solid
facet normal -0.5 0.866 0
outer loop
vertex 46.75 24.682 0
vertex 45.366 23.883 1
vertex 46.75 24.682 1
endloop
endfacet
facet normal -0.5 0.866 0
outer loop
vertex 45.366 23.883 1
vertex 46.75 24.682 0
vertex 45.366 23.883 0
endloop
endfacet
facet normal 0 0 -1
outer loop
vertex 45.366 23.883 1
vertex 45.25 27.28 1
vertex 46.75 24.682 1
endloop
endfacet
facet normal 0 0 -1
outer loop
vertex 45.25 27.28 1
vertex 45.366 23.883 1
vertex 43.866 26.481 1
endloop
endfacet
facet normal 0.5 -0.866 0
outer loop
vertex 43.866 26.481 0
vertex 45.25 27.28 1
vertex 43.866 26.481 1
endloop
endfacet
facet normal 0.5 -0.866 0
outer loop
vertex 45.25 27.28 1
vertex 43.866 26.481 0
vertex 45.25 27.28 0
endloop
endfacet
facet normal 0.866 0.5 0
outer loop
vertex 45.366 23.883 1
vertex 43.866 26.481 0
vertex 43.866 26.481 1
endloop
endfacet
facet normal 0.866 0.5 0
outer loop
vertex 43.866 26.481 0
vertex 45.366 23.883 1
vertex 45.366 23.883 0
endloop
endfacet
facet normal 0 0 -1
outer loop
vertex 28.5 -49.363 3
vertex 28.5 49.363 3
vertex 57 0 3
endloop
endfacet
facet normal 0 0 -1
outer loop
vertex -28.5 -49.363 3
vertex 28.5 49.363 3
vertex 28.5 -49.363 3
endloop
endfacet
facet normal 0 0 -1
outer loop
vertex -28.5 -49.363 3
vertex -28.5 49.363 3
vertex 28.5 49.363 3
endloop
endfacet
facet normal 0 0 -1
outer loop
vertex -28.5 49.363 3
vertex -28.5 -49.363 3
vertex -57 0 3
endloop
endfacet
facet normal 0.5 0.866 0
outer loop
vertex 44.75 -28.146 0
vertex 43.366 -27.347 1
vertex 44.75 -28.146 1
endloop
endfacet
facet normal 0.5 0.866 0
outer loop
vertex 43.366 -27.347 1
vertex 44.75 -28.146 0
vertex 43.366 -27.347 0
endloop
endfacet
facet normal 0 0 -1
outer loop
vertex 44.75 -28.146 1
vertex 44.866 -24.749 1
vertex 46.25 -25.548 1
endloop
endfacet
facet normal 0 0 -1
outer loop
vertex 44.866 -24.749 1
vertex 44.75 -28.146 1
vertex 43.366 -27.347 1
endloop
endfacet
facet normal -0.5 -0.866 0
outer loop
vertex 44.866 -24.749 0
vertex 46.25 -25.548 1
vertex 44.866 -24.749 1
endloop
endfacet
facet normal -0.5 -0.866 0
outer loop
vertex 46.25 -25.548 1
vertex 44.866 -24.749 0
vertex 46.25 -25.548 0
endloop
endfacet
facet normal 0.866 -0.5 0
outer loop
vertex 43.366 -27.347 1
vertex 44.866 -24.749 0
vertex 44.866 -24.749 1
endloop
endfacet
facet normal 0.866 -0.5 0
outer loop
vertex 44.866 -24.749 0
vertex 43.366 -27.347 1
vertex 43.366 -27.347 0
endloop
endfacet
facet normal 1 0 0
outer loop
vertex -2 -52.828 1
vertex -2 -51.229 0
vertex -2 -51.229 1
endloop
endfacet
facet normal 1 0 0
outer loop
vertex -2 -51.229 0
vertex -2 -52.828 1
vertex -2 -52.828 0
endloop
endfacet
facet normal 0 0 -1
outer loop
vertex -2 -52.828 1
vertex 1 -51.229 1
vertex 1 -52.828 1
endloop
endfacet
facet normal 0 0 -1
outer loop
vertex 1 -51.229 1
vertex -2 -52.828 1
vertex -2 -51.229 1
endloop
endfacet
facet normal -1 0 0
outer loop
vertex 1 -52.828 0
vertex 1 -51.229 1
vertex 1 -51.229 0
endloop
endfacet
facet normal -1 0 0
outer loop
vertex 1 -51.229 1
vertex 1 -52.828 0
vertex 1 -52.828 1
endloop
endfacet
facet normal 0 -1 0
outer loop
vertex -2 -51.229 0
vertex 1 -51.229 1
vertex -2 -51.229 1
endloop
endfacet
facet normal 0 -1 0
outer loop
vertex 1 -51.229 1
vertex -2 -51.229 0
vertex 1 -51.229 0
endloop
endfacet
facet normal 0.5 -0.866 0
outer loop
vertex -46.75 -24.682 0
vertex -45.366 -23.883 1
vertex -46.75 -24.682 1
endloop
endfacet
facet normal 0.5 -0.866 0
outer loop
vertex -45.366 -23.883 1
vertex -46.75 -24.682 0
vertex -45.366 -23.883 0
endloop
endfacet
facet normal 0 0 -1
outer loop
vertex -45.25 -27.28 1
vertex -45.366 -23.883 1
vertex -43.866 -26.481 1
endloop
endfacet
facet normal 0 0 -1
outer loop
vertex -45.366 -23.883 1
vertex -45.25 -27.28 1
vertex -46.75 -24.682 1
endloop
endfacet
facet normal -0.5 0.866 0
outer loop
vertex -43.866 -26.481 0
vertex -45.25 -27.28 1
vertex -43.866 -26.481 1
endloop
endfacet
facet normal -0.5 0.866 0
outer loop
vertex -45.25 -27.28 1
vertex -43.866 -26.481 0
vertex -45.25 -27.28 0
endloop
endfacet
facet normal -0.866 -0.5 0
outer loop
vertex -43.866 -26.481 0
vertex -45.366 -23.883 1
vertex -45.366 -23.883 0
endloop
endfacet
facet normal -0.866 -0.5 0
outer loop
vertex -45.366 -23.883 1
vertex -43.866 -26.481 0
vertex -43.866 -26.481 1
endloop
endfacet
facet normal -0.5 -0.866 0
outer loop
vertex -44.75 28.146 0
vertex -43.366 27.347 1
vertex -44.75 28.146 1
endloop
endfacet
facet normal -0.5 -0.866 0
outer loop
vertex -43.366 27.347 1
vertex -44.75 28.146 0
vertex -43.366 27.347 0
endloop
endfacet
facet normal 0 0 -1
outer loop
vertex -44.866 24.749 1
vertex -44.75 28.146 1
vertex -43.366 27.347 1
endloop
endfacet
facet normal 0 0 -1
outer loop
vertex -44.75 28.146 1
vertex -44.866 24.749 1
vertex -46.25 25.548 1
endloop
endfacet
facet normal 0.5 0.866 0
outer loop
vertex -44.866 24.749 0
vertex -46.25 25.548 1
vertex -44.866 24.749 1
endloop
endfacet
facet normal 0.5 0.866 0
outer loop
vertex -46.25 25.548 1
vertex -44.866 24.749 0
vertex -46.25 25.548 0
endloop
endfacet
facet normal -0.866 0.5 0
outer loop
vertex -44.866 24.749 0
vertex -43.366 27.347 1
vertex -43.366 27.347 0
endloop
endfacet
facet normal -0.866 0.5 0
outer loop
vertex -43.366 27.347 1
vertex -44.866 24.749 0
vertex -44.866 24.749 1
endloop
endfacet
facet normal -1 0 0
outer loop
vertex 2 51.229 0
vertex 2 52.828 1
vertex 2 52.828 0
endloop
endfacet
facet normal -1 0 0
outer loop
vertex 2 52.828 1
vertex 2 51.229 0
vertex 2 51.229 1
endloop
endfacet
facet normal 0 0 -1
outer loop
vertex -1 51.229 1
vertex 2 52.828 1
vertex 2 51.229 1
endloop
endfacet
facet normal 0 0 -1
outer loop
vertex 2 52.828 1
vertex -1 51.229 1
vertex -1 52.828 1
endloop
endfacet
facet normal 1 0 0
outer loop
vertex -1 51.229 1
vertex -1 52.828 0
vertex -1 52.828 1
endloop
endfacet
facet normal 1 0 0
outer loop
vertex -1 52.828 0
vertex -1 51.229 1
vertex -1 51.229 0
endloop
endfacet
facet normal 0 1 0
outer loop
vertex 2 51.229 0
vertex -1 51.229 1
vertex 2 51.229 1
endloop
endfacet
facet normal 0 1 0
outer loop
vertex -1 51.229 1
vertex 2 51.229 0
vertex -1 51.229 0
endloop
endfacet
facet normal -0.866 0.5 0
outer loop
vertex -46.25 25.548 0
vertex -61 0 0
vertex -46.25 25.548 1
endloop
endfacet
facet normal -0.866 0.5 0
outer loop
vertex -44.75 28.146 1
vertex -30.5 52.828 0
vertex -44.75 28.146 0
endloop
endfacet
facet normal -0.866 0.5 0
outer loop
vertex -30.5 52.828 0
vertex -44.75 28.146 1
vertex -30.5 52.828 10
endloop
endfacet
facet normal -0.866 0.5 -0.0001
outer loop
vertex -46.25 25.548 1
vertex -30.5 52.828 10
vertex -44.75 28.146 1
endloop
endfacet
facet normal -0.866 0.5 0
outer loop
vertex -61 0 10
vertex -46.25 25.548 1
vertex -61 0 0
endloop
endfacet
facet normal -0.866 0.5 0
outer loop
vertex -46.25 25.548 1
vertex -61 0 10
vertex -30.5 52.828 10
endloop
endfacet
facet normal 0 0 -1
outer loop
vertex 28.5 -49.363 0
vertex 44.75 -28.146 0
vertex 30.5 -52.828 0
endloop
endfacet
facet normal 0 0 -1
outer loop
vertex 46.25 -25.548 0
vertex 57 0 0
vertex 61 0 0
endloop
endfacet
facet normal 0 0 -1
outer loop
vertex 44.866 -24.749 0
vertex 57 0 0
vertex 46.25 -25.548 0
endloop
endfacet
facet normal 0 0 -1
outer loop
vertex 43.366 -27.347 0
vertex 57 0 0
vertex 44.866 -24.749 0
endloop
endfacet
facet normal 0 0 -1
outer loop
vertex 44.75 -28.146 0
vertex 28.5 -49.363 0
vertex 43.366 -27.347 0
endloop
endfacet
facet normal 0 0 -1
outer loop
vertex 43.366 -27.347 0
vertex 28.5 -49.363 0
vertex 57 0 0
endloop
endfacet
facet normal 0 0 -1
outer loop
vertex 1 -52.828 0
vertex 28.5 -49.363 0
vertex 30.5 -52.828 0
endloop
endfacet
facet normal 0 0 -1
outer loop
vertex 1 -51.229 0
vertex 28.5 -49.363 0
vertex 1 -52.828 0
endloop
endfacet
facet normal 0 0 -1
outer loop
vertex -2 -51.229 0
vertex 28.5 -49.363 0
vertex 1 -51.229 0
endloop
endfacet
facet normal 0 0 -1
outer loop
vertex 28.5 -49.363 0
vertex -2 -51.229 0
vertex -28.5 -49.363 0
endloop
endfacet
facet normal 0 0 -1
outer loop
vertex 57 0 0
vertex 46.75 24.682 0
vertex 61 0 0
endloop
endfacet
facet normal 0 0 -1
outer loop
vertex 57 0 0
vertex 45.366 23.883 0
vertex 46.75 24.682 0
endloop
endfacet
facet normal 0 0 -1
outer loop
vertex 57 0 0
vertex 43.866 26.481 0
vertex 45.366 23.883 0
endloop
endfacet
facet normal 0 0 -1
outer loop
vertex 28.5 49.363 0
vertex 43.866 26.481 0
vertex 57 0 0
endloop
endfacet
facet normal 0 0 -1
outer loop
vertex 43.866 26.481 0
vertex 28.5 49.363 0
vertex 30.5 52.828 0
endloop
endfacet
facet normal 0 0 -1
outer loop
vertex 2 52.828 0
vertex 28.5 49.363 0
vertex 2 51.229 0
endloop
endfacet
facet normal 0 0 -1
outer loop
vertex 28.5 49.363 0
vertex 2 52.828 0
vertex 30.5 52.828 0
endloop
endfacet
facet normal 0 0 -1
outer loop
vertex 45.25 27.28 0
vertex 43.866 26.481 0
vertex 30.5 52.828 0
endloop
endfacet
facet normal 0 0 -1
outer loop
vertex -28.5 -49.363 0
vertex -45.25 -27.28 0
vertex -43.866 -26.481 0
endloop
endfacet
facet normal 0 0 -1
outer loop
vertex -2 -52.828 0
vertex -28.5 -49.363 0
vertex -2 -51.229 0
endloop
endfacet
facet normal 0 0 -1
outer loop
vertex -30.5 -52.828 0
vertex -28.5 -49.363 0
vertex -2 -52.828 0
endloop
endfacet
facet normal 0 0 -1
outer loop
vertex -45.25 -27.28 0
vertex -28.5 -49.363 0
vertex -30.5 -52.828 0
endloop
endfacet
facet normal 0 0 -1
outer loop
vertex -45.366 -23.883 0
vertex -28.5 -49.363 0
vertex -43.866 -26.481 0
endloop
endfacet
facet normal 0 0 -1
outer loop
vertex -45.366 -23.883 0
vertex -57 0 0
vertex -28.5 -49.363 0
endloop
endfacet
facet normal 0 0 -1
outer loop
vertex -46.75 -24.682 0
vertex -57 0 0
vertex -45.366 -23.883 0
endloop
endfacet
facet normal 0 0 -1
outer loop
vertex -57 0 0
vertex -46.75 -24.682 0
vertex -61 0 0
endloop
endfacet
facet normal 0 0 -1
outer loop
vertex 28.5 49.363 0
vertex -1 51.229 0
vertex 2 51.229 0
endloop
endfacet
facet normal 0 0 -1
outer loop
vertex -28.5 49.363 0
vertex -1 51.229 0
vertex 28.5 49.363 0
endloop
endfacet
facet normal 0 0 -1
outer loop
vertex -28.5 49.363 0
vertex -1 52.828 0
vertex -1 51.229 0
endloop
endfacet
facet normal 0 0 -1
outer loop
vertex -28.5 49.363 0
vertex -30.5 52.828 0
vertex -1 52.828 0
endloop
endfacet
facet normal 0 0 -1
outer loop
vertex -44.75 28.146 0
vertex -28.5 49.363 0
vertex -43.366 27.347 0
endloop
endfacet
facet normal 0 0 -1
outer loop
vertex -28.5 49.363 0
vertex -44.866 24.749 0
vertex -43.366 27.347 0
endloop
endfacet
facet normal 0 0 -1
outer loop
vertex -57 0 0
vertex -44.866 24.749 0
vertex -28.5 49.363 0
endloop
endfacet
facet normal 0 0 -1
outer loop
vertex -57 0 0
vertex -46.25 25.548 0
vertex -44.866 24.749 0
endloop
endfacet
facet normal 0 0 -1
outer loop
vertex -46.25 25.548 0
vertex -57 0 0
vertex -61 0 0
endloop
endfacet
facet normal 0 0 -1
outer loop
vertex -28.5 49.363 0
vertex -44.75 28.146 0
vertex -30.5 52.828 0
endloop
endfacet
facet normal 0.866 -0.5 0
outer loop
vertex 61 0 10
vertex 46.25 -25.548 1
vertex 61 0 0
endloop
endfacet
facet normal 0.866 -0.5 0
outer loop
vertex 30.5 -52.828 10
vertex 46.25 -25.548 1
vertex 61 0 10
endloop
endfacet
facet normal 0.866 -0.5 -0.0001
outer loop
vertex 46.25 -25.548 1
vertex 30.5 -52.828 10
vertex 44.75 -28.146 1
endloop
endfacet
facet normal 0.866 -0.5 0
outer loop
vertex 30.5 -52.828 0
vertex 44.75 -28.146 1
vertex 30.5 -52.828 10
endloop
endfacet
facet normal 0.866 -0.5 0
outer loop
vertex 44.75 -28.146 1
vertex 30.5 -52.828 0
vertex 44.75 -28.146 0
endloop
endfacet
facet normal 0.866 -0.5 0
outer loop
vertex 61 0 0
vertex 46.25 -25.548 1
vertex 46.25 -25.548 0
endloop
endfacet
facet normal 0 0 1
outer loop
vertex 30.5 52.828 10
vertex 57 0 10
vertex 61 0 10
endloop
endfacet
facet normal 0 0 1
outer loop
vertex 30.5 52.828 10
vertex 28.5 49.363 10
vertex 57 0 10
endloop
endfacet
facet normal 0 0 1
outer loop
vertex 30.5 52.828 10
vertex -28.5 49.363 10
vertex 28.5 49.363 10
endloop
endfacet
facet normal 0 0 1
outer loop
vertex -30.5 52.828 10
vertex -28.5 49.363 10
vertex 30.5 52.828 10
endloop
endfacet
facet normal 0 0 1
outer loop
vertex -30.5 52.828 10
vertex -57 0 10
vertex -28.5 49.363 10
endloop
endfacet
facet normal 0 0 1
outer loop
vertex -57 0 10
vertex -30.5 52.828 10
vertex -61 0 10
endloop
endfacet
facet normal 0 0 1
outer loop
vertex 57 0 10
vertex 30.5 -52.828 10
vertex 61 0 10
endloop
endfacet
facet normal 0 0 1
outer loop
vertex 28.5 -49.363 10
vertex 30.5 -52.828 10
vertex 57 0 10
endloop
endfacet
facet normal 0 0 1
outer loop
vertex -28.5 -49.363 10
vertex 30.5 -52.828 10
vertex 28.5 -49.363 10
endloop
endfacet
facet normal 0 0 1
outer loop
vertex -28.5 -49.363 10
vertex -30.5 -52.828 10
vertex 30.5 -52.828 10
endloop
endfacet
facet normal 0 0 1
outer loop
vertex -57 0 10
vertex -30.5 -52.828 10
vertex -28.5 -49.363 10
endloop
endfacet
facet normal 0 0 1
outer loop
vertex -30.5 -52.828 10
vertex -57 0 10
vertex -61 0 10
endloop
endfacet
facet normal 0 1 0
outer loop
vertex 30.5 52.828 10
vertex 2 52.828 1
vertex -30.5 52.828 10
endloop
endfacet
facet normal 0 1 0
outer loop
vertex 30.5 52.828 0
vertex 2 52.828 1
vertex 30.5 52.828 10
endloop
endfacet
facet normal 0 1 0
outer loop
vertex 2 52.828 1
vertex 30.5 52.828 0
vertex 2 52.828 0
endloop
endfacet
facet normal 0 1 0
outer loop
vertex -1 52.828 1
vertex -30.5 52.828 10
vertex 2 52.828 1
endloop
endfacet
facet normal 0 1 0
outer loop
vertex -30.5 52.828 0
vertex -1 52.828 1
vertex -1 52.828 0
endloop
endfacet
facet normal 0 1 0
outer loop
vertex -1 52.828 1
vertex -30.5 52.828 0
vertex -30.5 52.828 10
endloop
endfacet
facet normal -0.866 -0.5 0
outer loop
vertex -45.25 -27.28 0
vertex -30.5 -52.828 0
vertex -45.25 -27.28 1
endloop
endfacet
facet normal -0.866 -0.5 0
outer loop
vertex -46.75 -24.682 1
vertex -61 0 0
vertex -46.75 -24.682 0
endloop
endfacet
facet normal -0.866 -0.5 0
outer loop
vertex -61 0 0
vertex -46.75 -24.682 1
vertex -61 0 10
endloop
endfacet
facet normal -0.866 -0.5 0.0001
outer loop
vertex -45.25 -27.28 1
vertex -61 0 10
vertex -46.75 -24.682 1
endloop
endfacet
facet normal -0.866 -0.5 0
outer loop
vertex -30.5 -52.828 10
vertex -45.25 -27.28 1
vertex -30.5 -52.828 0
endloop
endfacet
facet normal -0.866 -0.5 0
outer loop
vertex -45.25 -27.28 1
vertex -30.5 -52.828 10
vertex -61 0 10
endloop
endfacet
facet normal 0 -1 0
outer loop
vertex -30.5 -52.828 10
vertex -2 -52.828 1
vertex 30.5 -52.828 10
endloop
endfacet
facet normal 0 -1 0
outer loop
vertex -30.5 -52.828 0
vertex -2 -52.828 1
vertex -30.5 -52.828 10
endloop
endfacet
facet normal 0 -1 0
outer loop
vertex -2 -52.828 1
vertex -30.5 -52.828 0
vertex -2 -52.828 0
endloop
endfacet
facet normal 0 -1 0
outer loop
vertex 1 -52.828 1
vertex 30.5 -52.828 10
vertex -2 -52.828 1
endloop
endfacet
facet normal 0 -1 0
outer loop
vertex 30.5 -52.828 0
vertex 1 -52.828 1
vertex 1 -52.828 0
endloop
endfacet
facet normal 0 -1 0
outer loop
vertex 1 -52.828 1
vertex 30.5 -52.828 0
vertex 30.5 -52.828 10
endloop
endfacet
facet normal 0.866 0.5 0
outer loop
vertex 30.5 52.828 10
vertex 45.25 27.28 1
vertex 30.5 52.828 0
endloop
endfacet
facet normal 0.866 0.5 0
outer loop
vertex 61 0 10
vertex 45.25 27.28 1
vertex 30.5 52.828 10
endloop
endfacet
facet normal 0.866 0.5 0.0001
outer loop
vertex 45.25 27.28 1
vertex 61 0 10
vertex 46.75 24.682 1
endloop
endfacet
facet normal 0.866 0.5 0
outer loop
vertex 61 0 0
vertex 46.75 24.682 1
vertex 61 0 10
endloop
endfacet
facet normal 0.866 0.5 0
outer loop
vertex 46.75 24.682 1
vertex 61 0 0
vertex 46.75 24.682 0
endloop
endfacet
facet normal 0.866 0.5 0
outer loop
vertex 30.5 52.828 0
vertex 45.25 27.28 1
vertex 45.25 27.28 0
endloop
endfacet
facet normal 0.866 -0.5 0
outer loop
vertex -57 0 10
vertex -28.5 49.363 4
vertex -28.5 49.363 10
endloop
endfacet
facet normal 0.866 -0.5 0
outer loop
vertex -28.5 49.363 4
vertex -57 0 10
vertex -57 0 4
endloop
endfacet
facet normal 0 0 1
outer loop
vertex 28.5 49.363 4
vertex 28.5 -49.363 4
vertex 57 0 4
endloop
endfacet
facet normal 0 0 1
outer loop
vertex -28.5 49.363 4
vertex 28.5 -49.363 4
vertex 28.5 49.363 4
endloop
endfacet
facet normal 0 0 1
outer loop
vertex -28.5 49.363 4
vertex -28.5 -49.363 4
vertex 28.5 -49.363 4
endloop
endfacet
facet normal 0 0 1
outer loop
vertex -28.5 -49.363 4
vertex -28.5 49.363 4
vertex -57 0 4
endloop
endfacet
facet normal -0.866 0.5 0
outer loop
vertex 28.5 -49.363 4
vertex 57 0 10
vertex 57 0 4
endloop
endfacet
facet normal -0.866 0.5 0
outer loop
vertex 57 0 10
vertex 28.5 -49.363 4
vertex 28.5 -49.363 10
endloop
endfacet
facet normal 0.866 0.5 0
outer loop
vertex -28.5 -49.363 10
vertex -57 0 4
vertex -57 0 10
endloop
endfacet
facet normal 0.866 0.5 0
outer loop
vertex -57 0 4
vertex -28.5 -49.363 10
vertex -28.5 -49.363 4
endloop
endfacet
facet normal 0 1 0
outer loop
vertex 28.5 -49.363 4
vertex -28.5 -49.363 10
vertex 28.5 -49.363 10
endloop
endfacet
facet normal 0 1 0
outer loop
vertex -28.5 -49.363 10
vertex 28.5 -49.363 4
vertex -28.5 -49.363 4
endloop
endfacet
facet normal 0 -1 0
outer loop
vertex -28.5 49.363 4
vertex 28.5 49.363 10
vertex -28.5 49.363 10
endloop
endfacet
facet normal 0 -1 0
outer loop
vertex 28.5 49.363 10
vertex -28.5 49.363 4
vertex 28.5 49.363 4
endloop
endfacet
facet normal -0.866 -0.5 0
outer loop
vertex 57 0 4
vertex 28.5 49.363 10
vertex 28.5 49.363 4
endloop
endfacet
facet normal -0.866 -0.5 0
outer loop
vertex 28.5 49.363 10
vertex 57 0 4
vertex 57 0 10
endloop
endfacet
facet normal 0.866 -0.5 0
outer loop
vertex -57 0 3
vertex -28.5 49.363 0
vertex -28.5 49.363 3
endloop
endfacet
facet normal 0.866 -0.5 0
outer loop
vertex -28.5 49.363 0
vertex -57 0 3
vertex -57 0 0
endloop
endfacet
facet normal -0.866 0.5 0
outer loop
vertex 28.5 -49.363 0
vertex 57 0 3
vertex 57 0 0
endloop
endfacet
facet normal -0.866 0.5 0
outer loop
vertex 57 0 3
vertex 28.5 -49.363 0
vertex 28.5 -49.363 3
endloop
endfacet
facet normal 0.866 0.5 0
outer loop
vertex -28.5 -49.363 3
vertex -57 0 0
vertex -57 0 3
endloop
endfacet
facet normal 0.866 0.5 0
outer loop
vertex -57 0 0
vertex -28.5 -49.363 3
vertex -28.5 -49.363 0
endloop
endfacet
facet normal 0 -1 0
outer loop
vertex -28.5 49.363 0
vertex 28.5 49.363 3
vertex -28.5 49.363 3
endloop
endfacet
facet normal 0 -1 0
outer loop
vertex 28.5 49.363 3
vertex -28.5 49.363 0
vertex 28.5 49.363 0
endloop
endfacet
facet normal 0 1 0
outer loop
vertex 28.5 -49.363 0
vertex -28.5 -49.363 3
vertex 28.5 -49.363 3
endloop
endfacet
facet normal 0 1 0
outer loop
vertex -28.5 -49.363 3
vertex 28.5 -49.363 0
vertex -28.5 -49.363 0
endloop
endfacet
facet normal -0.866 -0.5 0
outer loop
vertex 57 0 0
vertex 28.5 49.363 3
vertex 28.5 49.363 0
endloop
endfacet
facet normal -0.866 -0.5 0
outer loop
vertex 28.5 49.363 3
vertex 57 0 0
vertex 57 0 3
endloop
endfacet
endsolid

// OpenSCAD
function toUnits(inches, thrsecs) = (inches * 32) + thrsecs;

hexCrossVertex = toUnits(3,14);
tileRadius = (hexCrossVertex / 2);

wallThickness = 3;

frameRadius = tileRadius  + wallThickness * 2; // 3/32" on either side
frameheight = 10; // 5/16

floorThickess = 2; // 1/16
floorHeight = 3;

voidRadius = tileRadius + 2;
voidheight = frameheight - floorHeight - floorThickess + 2; // 1/8" + some extra

bottomvoidRadius = frameRadius - 4; // 1/16 on each side
bottomVoidThickness = floorHeight + 1;

// reference tile
%translate ([0,0,floorHeight + floorThickess + 1])
linear_extrude (2) {
    circle(tileRadius, $fn=6);
}

// frame

difference() {
    linear_extrude (frameheight) {
        circle(frameRadius, $fn=6);
    }


    translate ([0,0,4])
    linear_extrude (voidheight) {
        circle(voidRadius, $fn=6);
    }
    
    translate ([0,0,floorHeight - bottomVoidThickness])
    linear_extrude (bottomVoidThickness) {
        circle(bottomvoidRadius, $fn=6);
    }
    #holes();
    
}

module shim() {
    polyhedron(
  points=[ 
  [0,0,0],   // 0
  [5,0,0],  // 1
  [1, 2, 0], // 2
  [4,2,0],  // 3
  [1,2,2], // 4
  [4,2,2], // 5
  [0,0,4], // 6
  [5,0,4] // 7
  ],                                  
  faces=[ 
    [0,1,2], [1,2,3], // bottom
    [2,3,4], [3,4,5],  // face
    [4,6,7], [4,5,7], // pitch
    [0,1,7], [0,6,7],  // back
    [0,2,4], [0,4,6], // left
    [1,3,5], [1,5,7] // right
    ]         ,
convexity = 10    
 );
    translate([1,2,0]) cube ([3,3,2]);
    translate([0,-1,0]) cube([5,1,4]);
 }
 
 
//scale ([10,10,10]) shim();
 
module holes() {
    pathRadius=frameRadius - 3;

    sides=6;
    apothem = pathRadius / (2 * tan (180 / sides));

    for (i=[1:sides])  {
        translate(
            [
                apothem*sin(i*(360/sides)),
                apothem*cos(i*(360/sides)),
                0
            ]
        ) 
        rotate ([0,0,-((i) * 60) ]) 
        translate ([-2,-1,-1])    
        shim();
    }

}

    

 
